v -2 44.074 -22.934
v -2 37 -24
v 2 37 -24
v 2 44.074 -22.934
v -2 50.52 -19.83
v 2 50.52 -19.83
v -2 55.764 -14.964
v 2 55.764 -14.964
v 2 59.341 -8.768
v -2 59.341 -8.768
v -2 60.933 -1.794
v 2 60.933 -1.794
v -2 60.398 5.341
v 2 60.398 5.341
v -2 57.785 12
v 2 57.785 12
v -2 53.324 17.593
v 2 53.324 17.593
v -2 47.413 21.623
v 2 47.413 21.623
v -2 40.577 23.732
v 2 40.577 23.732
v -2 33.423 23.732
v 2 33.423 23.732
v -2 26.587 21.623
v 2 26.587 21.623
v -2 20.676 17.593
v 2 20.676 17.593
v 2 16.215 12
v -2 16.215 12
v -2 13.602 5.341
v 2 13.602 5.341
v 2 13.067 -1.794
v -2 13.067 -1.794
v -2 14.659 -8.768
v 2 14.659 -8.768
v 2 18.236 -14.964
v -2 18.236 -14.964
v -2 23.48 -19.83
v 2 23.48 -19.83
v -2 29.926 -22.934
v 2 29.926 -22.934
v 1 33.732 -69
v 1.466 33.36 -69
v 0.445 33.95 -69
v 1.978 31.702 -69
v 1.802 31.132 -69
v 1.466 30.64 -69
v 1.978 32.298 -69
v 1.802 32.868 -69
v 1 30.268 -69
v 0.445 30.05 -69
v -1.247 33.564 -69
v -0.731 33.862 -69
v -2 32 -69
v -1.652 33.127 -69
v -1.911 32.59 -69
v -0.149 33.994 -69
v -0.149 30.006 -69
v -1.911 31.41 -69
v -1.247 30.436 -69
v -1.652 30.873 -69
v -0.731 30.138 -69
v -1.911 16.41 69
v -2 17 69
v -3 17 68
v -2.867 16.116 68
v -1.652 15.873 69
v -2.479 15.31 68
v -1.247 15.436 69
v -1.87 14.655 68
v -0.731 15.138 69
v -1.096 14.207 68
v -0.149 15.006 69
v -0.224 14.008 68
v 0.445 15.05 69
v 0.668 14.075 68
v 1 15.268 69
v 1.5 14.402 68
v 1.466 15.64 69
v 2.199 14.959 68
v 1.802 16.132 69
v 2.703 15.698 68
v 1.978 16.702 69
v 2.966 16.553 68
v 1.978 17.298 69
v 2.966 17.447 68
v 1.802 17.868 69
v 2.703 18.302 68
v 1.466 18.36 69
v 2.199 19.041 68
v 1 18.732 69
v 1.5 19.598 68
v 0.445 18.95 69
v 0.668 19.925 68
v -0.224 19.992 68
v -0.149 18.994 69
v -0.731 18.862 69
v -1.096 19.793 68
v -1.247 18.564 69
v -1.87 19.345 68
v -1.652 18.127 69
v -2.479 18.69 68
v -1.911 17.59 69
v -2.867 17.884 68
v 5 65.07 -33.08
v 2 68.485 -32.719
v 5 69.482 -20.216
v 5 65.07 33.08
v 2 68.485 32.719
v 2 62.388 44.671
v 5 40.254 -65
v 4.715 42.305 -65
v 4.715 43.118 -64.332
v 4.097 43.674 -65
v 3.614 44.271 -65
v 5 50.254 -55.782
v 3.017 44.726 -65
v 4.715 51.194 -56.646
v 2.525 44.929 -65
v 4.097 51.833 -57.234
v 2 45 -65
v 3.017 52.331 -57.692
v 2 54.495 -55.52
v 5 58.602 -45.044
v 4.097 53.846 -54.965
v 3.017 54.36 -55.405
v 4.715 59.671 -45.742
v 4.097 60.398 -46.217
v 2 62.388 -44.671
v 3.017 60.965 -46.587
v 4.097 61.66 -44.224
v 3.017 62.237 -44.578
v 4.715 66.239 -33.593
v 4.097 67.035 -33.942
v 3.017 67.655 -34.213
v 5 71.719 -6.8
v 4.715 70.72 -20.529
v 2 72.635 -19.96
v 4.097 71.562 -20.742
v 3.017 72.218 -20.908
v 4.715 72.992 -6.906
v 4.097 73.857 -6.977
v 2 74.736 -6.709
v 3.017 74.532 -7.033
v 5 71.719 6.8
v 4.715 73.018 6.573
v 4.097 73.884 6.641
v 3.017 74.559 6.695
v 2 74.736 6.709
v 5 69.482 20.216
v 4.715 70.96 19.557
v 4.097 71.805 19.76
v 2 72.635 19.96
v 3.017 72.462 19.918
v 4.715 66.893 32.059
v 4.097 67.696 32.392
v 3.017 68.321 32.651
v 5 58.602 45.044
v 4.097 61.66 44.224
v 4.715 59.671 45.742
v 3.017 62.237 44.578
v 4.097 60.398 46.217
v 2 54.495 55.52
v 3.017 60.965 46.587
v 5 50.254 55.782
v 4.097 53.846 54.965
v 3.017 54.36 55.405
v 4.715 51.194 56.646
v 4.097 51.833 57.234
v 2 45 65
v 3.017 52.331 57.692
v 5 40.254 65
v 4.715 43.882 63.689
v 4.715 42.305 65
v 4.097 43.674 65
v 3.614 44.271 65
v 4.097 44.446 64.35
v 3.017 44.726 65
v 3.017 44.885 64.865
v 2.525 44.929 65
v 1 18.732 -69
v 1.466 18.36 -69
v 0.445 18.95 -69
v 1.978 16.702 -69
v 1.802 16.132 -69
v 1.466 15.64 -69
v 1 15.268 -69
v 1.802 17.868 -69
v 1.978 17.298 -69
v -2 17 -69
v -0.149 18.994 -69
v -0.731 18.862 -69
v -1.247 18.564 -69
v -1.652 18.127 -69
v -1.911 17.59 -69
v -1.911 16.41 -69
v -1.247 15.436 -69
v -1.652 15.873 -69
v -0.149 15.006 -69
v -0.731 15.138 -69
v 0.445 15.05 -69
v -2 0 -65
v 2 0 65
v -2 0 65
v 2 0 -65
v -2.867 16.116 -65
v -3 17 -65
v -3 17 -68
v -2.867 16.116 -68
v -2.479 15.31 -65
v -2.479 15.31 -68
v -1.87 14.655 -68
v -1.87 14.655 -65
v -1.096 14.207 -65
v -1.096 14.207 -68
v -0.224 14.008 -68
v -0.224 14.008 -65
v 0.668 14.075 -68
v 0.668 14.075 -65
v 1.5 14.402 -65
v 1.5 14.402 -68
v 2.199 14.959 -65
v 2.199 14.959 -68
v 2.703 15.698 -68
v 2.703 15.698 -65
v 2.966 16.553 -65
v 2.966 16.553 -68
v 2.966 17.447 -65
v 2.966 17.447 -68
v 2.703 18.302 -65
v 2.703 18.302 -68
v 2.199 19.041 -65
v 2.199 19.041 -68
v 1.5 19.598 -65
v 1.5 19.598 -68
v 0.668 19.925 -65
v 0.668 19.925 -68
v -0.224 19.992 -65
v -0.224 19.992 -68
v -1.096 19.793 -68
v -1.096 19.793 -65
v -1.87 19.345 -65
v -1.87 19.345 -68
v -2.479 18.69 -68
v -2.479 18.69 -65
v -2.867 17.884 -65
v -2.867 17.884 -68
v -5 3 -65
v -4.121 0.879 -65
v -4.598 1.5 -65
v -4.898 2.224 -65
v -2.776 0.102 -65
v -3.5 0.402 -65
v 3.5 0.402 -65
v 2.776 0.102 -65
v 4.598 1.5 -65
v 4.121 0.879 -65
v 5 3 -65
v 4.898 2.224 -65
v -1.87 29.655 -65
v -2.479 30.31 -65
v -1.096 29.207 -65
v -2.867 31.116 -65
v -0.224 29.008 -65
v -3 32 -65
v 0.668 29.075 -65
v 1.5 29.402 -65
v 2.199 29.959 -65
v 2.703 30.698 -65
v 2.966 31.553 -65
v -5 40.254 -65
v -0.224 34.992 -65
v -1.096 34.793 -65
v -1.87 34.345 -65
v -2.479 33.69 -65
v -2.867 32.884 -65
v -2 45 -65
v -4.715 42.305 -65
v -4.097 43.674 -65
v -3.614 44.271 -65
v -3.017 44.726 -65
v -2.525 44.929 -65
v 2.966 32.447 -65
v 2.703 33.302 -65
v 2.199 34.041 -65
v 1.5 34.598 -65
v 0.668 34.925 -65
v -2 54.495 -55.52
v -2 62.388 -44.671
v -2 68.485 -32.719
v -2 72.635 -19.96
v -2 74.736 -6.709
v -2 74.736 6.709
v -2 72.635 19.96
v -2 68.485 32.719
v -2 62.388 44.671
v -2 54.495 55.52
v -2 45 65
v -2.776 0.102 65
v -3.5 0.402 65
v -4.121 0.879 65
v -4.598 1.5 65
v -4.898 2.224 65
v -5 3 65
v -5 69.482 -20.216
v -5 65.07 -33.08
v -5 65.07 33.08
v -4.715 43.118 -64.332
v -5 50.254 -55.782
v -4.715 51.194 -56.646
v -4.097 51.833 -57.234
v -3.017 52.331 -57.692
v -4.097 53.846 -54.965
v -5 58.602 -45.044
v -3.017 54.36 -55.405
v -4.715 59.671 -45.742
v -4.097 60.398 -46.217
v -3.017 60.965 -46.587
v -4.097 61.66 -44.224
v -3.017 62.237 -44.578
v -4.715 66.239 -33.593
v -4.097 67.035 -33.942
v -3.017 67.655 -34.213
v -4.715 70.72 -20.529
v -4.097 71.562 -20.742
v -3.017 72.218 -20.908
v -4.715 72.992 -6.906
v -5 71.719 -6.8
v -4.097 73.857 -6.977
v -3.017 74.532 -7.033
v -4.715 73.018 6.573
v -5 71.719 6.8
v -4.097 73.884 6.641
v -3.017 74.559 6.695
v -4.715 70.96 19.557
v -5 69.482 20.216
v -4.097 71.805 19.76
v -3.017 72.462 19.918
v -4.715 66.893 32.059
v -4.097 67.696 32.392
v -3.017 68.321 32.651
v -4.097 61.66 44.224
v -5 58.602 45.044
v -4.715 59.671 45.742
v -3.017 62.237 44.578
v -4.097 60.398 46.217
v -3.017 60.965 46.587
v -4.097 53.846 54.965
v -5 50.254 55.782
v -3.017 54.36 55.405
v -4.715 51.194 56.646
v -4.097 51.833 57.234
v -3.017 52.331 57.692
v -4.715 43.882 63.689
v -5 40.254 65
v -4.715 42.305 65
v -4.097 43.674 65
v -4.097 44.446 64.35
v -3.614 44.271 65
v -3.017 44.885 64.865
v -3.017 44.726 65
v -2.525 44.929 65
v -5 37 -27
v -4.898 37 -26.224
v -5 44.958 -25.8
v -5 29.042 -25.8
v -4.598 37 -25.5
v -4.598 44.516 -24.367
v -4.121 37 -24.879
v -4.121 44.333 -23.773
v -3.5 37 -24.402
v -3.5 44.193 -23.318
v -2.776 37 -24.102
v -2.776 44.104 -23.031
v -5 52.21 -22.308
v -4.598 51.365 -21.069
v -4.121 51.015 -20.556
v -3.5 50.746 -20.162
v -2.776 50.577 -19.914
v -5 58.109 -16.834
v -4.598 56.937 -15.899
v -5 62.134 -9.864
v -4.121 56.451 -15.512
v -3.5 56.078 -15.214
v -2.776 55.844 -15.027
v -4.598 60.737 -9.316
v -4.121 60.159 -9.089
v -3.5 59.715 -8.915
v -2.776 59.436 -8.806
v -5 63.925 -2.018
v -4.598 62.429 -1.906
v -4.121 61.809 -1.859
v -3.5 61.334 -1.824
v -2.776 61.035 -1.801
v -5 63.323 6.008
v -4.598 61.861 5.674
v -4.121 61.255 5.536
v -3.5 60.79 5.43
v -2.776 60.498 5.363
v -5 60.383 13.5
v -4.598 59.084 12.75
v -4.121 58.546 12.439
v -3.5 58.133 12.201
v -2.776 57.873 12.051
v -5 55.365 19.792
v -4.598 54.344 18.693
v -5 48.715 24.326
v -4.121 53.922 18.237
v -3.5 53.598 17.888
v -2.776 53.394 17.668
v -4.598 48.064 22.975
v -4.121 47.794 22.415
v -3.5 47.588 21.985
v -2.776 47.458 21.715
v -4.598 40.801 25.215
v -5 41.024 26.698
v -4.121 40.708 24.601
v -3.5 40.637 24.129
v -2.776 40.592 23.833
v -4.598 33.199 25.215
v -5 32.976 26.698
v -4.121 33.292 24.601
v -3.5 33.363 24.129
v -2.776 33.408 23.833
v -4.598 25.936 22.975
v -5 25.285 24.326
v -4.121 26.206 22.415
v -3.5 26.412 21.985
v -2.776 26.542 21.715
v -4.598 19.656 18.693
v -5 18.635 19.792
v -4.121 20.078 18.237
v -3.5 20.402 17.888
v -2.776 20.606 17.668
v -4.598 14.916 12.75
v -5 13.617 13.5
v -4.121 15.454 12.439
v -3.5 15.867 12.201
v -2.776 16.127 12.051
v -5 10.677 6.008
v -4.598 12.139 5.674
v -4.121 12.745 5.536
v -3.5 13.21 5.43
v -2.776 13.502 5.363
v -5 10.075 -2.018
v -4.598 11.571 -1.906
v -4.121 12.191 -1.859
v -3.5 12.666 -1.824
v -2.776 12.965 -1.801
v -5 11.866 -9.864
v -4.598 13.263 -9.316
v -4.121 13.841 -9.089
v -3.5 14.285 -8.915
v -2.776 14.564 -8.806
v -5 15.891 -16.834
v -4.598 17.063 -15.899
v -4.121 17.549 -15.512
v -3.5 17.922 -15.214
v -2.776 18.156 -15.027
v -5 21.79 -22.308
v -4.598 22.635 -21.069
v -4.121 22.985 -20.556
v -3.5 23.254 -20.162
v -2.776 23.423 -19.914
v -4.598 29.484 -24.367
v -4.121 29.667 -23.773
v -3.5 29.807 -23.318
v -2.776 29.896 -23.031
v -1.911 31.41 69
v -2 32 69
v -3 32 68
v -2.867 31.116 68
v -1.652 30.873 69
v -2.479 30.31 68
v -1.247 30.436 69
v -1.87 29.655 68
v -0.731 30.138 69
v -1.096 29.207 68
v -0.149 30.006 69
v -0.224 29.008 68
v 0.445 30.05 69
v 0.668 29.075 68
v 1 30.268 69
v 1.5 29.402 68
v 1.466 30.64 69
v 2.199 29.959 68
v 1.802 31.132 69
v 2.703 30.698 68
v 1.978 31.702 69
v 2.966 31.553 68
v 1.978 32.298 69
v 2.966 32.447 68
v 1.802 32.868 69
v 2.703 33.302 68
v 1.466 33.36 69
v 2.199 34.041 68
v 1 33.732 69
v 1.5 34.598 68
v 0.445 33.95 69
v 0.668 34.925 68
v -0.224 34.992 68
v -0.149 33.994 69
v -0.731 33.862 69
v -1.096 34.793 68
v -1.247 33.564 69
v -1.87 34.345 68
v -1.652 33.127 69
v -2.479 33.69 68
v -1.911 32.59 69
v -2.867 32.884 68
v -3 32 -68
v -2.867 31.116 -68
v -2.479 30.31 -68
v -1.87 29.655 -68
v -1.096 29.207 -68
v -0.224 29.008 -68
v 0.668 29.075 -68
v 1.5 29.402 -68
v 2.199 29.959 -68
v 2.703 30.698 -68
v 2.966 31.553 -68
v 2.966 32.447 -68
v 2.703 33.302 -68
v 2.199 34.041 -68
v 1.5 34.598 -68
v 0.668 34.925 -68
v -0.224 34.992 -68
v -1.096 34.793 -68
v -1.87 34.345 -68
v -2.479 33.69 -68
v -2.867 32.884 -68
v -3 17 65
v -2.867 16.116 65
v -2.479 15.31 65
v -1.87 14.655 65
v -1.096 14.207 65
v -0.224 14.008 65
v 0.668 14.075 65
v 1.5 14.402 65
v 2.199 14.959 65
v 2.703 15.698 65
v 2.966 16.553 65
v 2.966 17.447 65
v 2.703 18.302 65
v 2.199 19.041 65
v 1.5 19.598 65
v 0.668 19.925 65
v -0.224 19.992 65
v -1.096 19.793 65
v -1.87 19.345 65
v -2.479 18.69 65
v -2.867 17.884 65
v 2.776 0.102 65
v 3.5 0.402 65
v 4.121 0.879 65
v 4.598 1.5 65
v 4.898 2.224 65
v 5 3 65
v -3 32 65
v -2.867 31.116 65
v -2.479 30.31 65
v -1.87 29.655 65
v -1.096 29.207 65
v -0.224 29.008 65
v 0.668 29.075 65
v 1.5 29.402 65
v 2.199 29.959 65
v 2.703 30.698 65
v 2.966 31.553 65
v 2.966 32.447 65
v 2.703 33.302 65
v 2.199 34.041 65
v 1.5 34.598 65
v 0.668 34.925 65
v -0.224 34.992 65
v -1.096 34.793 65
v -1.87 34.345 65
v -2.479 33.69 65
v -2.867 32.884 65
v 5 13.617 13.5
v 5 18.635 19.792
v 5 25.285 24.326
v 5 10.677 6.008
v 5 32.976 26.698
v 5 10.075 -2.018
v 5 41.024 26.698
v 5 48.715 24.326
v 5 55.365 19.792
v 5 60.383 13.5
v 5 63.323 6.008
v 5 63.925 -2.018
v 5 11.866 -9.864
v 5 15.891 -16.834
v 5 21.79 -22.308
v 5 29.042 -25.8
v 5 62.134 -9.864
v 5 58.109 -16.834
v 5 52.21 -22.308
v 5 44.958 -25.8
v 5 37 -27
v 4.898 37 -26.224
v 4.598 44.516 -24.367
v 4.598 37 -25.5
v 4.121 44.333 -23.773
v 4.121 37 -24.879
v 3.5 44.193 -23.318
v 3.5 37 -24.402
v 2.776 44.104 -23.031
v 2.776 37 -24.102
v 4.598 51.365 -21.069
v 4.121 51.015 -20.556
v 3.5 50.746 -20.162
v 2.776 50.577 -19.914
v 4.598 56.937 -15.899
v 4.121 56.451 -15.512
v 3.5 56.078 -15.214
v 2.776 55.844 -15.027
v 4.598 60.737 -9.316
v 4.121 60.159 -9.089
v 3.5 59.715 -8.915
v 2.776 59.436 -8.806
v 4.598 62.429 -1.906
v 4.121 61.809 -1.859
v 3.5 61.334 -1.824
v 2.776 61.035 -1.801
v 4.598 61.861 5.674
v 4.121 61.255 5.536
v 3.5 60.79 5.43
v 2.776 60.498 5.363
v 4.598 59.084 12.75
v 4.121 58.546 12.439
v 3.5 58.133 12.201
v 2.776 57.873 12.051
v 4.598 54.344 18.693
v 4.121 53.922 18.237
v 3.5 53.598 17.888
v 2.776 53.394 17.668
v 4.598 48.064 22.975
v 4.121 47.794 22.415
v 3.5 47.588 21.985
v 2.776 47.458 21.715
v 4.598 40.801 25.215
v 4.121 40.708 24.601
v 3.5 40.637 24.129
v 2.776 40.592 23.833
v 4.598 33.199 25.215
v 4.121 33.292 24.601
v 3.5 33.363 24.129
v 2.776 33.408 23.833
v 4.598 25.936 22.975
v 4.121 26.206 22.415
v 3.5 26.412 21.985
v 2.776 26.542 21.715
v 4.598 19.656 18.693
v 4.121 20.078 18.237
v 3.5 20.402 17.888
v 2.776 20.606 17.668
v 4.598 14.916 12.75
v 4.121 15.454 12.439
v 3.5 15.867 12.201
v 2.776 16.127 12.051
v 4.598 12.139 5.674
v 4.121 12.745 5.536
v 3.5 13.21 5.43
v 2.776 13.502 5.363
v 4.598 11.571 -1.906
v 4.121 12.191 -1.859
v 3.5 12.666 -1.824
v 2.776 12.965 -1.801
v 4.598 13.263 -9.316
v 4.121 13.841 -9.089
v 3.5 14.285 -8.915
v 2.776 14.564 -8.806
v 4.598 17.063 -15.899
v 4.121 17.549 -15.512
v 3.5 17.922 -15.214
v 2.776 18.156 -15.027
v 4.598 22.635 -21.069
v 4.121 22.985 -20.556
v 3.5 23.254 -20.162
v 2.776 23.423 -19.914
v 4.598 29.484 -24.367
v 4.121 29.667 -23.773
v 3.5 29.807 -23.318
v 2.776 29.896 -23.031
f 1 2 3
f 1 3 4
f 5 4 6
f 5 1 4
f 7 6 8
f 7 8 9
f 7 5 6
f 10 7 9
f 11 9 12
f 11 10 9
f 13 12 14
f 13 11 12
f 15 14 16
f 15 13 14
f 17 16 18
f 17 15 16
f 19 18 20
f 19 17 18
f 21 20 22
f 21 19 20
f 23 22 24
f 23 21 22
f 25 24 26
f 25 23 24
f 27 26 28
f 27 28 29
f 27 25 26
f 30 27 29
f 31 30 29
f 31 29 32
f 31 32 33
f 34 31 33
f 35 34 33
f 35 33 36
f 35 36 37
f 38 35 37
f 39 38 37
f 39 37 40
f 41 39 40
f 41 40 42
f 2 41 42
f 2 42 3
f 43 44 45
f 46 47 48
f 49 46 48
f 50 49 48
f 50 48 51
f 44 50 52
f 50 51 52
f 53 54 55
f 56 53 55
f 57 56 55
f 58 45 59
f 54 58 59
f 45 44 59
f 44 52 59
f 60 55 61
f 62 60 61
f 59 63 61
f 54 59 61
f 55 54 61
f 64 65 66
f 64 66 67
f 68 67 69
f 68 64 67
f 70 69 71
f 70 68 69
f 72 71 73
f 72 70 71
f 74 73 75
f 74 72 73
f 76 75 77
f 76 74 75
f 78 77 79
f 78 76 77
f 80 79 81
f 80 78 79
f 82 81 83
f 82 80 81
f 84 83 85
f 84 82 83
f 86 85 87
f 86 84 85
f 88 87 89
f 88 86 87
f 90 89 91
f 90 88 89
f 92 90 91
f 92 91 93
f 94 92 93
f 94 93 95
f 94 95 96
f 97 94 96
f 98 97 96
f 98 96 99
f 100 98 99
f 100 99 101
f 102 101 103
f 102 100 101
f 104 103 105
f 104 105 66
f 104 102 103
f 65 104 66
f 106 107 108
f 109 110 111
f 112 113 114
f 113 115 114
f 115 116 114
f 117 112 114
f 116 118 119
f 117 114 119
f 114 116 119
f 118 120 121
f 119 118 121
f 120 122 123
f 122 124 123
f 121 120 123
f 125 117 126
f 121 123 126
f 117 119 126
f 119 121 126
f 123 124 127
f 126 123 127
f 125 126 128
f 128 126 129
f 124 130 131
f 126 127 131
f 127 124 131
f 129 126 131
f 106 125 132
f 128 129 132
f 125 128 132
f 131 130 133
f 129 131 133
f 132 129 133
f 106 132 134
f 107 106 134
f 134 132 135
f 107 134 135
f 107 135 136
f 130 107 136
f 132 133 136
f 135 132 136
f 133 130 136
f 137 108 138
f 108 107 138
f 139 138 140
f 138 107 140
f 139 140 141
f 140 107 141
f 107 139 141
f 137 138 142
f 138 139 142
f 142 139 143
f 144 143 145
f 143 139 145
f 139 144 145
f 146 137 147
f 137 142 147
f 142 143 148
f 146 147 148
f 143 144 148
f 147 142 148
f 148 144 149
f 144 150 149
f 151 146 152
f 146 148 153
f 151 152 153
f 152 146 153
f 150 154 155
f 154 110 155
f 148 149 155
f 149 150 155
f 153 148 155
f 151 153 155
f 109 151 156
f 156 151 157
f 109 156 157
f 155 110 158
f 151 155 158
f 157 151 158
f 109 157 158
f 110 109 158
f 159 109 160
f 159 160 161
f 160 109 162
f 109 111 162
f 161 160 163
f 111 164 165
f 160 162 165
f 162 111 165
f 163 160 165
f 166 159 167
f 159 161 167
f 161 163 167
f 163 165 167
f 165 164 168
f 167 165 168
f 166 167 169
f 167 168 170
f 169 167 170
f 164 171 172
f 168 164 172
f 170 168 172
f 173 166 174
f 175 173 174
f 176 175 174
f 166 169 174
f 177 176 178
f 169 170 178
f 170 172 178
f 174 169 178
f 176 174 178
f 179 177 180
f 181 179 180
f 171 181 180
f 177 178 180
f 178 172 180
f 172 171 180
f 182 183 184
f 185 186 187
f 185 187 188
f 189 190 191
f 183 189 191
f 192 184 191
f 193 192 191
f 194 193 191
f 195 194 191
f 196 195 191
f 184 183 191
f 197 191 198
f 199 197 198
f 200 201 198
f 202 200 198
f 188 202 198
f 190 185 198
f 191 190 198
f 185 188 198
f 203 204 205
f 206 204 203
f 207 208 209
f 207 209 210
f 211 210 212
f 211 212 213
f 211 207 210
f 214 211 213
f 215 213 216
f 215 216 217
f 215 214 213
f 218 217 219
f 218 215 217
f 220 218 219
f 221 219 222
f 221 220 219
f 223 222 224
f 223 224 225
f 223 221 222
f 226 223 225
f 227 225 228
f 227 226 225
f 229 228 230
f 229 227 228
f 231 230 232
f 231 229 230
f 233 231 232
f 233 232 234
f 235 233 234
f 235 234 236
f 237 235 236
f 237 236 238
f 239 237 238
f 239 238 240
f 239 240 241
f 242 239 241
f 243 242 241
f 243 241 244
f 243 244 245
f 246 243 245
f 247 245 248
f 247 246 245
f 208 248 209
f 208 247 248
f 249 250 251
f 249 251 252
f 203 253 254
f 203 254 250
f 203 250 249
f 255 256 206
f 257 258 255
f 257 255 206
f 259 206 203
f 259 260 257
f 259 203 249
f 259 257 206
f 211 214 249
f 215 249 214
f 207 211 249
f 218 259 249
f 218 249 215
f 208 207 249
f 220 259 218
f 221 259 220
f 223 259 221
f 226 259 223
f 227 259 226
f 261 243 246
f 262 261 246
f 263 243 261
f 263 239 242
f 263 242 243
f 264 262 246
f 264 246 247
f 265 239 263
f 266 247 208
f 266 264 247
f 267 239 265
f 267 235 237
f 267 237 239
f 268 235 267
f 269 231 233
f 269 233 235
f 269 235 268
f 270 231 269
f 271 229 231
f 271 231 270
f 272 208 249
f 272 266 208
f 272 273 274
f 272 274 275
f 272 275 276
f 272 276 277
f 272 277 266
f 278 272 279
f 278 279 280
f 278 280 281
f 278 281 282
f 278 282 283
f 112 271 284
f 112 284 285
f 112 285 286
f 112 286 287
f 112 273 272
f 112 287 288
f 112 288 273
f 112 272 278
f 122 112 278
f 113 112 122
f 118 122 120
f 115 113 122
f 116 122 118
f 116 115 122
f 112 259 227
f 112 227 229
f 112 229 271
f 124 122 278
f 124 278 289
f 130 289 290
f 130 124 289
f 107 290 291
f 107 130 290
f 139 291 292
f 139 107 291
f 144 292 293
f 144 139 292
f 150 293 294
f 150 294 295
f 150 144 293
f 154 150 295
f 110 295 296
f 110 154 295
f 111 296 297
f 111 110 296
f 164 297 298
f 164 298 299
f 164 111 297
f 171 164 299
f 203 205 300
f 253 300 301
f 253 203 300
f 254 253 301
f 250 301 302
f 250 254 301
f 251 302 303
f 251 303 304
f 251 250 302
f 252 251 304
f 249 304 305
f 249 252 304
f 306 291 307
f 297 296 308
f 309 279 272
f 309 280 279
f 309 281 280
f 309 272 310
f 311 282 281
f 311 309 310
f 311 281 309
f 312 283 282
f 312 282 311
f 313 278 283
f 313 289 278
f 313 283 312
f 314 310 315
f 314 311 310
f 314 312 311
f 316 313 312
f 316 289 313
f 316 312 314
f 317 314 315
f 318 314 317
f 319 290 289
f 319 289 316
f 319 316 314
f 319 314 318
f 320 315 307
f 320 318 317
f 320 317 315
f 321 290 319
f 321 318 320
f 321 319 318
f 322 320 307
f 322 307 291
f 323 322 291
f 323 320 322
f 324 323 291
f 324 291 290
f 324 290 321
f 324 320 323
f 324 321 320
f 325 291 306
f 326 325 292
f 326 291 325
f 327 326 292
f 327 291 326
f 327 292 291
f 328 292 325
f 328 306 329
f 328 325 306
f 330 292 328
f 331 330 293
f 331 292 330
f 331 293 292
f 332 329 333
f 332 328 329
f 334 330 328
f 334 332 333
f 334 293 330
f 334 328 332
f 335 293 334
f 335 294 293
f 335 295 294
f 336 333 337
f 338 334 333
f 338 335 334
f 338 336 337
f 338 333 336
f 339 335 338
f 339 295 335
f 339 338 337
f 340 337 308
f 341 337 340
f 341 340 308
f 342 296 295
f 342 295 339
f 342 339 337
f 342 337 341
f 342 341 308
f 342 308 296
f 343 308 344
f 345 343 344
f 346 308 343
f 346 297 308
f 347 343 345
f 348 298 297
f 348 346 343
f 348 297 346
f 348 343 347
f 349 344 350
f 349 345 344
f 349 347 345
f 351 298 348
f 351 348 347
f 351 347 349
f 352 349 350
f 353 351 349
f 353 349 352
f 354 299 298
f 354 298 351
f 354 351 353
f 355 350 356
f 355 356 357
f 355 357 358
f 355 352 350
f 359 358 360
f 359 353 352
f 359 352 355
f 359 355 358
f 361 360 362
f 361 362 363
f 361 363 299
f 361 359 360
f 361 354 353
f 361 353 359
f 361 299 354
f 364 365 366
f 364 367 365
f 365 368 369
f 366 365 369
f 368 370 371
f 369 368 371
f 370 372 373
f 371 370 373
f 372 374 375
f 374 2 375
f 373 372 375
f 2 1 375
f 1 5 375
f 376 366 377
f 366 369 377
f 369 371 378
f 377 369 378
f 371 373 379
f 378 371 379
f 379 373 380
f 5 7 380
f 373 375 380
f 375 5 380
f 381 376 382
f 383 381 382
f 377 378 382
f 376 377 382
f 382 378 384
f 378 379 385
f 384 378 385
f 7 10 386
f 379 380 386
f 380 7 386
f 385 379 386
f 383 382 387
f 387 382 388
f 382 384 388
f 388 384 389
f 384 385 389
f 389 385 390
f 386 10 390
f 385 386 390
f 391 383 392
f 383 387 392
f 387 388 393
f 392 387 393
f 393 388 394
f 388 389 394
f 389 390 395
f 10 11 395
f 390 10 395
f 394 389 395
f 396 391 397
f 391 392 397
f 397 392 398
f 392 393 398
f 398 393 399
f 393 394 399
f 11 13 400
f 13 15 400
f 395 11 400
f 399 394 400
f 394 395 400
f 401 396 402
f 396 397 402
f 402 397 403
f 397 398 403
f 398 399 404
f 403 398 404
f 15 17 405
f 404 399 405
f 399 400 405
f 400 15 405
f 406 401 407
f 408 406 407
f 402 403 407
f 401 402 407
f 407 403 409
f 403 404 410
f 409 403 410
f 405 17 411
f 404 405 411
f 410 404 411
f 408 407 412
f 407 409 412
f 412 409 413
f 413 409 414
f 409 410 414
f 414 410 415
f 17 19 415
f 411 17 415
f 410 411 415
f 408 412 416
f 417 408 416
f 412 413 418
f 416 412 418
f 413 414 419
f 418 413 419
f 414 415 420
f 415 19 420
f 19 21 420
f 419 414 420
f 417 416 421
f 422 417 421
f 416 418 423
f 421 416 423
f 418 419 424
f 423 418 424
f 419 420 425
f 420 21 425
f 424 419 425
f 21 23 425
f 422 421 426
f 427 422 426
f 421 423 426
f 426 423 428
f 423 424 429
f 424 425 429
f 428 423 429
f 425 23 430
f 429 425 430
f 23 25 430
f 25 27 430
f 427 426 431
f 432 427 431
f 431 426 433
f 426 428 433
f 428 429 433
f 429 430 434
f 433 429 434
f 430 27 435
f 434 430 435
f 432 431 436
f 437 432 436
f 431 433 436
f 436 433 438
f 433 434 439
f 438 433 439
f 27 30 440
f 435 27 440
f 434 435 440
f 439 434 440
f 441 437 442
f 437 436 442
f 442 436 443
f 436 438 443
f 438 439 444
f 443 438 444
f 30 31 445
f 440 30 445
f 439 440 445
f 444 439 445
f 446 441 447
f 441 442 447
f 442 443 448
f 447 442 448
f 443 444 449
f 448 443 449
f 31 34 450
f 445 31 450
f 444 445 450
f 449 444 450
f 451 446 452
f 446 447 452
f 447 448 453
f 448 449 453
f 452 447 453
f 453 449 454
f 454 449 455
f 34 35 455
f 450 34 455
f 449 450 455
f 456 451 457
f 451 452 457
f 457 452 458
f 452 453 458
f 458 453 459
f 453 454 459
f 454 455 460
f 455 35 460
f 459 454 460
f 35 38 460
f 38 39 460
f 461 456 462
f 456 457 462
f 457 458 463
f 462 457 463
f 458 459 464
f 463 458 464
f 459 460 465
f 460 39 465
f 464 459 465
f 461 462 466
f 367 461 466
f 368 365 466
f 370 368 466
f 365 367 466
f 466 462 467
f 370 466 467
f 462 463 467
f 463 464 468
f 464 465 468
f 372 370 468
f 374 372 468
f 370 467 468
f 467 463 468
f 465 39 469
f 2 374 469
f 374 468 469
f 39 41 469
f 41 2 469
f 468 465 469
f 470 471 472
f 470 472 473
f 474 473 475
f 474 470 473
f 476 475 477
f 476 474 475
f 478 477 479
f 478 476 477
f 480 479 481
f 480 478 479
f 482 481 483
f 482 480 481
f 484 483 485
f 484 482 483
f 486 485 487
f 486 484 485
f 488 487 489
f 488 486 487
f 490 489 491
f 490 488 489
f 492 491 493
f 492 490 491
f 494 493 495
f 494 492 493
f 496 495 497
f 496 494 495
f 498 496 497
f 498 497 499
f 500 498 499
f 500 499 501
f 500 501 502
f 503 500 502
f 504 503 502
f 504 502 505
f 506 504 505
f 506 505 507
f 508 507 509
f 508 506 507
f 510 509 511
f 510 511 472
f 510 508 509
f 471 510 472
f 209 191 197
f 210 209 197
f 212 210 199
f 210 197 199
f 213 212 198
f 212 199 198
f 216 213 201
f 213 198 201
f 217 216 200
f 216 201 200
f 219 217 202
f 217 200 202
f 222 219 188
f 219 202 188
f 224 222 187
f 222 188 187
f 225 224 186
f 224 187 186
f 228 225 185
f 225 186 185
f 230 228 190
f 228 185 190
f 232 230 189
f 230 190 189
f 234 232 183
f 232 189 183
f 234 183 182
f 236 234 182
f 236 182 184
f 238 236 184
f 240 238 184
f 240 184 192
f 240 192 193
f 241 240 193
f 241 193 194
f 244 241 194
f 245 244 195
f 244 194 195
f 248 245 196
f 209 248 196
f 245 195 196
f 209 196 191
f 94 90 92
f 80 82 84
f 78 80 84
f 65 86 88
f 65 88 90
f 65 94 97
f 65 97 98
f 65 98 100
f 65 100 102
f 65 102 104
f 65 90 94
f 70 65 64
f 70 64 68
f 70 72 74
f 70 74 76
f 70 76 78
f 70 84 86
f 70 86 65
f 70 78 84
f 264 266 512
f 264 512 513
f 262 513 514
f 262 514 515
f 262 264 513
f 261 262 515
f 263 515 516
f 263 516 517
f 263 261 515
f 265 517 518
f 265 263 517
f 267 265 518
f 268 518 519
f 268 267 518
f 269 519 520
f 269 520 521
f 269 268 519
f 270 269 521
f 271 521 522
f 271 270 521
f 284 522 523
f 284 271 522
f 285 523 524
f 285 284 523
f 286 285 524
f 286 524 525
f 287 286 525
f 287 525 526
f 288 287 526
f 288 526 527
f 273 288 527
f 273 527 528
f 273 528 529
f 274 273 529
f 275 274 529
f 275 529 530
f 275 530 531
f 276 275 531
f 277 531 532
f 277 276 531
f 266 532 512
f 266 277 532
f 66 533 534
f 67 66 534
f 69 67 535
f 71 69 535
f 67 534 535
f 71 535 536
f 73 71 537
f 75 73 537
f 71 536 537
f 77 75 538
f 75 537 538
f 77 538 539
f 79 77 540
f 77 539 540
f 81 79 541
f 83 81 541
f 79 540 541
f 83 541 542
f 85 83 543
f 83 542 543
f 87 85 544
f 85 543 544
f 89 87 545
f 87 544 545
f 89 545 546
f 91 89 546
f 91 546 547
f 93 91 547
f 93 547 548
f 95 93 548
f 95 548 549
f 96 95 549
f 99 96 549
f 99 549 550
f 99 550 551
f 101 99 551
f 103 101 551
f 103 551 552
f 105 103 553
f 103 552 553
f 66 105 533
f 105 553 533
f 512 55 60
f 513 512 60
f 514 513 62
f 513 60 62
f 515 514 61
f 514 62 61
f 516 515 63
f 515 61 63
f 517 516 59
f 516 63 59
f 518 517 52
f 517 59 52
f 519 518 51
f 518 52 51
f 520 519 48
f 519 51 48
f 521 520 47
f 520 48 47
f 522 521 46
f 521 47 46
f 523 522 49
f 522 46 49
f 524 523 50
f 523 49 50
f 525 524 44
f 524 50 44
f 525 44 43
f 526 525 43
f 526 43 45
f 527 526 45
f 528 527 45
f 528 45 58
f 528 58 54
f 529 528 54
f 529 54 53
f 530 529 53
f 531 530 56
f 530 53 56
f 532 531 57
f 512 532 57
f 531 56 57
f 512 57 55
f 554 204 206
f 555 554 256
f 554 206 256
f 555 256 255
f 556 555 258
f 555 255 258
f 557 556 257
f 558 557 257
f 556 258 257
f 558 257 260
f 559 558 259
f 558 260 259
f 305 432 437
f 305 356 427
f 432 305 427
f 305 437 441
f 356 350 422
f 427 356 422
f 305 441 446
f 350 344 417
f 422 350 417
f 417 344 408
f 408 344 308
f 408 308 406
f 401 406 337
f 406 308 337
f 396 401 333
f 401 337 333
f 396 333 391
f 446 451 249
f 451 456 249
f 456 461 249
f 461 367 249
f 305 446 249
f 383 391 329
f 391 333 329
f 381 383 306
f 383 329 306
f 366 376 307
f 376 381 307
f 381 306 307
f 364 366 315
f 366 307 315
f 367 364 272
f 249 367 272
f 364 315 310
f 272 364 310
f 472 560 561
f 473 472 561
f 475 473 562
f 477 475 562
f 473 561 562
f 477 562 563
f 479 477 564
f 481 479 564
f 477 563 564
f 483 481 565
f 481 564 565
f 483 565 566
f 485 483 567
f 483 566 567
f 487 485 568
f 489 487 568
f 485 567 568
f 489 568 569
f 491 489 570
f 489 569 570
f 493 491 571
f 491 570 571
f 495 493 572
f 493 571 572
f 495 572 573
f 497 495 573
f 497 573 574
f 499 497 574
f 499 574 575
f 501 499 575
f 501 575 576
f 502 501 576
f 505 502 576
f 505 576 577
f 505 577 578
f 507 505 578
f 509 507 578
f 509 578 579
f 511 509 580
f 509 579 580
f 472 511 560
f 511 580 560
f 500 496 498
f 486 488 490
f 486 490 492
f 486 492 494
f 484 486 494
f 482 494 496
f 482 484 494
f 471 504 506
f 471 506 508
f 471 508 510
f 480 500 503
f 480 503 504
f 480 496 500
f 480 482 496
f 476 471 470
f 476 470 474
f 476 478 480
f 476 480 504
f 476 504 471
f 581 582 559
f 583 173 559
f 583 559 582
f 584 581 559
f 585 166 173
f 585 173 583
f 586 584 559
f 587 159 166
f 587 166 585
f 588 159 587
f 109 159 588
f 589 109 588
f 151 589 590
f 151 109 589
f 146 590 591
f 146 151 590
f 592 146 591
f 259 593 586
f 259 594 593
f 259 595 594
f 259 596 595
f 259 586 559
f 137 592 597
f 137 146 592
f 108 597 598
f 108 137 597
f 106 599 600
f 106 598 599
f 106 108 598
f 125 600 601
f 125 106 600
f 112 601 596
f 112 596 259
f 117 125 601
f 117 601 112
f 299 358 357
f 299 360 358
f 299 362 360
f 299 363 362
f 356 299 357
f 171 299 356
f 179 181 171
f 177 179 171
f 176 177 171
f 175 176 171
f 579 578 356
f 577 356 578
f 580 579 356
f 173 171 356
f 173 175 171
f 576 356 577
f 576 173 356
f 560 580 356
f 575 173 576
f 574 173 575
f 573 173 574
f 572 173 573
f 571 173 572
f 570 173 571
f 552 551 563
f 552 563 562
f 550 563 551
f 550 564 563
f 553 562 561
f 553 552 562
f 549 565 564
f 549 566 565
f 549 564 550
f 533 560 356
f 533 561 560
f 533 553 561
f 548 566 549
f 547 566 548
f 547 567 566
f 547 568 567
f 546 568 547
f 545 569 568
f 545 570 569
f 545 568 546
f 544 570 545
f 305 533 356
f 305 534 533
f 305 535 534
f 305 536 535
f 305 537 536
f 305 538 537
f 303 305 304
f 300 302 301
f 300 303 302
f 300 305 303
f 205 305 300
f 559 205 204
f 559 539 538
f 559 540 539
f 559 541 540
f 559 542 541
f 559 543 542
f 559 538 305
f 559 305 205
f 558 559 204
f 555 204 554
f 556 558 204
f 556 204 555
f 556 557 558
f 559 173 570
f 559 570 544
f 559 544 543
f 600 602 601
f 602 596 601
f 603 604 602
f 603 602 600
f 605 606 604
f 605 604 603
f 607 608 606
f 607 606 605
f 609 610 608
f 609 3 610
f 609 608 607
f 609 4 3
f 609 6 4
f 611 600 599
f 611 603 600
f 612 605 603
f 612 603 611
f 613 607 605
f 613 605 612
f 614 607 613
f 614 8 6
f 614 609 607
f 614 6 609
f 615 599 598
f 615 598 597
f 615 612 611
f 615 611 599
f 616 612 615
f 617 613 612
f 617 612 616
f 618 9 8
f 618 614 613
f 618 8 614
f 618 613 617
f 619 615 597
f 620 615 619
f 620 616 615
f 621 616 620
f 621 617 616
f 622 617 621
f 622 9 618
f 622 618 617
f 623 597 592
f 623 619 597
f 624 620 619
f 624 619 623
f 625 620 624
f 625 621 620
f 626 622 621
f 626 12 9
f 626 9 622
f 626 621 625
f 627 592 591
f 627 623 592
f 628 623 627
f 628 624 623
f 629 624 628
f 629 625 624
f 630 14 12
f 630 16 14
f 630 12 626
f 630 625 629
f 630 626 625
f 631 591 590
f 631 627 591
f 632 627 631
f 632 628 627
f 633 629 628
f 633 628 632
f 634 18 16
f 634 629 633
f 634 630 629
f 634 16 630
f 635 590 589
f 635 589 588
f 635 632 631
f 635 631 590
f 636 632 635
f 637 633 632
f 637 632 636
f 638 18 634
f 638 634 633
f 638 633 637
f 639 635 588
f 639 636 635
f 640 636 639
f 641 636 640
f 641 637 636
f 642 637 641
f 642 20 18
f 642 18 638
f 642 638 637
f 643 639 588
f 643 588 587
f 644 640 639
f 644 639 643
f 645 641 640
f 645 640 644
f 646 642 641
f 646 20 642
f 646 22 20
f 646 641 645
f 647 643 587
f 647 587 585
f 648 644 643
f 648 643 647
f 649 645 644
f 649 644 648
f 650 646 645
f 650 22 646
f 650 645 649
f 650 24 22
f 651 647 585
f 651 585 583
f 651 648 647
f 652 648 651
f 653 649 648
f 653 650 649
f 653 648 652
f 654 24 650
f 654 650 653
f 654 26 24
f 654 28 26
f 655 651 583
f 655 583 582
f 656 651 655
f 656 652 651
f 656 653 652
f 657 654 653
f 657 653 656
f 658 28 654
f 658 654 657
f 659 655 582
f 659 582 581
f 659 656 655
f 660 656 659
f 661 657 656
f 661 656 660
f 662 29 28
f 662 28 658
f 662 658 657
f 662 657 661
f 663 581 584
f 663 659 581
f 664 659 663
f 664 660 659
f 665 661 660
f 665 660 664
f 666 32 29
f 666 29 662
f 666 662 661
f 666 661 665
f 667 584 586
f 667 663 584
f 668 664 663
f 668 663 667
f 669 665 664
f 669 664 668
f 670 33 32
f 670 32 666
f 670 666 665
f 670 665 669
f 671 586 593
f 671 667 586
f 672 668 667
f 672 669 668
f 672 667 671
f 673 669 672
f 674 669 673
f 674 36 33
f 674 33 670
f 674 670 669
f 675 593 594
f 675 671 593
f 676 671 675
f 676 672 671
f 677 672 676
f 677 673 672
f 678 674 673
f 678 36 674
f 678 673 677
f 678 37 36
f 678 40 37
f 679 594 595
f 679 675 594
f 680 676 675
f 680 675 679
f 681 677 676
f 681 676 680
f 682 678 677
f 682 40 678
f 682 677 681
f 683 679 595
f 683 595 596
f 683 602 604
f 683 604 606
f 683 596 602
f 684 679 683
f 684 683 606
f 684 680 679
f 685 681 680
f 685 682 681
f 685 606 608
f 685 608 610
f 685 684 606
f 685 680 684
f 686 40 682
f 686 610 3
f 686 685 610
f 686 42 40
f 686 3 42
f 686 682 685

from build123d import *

# Parameters (mm, degrees)
SKETCH_1_R                 = 24
EXTRUDE_1_DEPTH            = 5
SKETCH_2_R                 = 3
EXTRUDE_2_DEPTH            = 4
CHAMFER_1_SIZE             = 1
CHAMFER_1_OF_MIRROR_1_SIZE = 1
FILLET_1_R                 = 3


with BuildPart() as part:
    # 草圖1 → 伸長1 (new, symmetric)
    with BuildSketch(Plane(origin=(0, 0, 0), x_dir=(0, 0, -1), z_dir=(1, 0, 0))):
        with BuildLine():
            Line((-65, 45), (-65, 0))
            Line((-65, 0), (65, 0))
            Line((65, 0), (65, 45))
            ThreePointArc((65, 45), (0, 75), (-65, 45))
        make_face()
        with Locations((0, 37)):
            Circle(SKETCH_1_R, mode=Mode.SUBTRACT)
    extrude(amount=EXTRUDE_1_DEPTH, both=True)

    # 草圖2 → 伸長2 (add)
    with BuildSketch(Plane.XY.offset(65)):
        with Locations(Location((0, 32, 0), (0, 0, 180))):
            Circle(SKETCH_2_R)
        with Locations(Location((0, 17, 0), (0, 0, 180))):
            Circle(SKETCH_2_R)
    extrude_2 = extrude(amount=EXTRUDE_2_DEPTH)

    # 導角1
    chamfer_1_edges = [part.edges().sort_by_distance(p)[0] for p in [
        (3, 32, 69),
        (3, 17, 69),
    ]]
    chamfer(chamfer_1_edges, length=CHAMFER_1_SIZE)

    # 鏡射1: 伸長2 across plane
    add(extrude_2.mirror(Plane.XY))

    # 導角1 of 鏡射1
    chamfer_1_of_mirror_1_edges = [part.edges().sort_by_distance(p)[0] for p in [
        (3, 32, -69),
        (3, 17, -69),
    ]]
    chamfer(chamfer_1_of_mirror_1_edges, length=CHAMFER_1_OF_MIRROR_1_SIZE)

    # 圓角1
    fillet_1_edges = [part.edges().sort_by_distance(p)[0] for p in [
        (5, 0, 0),
        (-5, 37, 24),
        (5, 37, 24),
        (5, 75, 0),
        (-5, 0, 0),
        (-5, 75, 0),
    ]]
    fillet(fillet_1_edges, radius=FILLET_1_R)


solid = part.part
